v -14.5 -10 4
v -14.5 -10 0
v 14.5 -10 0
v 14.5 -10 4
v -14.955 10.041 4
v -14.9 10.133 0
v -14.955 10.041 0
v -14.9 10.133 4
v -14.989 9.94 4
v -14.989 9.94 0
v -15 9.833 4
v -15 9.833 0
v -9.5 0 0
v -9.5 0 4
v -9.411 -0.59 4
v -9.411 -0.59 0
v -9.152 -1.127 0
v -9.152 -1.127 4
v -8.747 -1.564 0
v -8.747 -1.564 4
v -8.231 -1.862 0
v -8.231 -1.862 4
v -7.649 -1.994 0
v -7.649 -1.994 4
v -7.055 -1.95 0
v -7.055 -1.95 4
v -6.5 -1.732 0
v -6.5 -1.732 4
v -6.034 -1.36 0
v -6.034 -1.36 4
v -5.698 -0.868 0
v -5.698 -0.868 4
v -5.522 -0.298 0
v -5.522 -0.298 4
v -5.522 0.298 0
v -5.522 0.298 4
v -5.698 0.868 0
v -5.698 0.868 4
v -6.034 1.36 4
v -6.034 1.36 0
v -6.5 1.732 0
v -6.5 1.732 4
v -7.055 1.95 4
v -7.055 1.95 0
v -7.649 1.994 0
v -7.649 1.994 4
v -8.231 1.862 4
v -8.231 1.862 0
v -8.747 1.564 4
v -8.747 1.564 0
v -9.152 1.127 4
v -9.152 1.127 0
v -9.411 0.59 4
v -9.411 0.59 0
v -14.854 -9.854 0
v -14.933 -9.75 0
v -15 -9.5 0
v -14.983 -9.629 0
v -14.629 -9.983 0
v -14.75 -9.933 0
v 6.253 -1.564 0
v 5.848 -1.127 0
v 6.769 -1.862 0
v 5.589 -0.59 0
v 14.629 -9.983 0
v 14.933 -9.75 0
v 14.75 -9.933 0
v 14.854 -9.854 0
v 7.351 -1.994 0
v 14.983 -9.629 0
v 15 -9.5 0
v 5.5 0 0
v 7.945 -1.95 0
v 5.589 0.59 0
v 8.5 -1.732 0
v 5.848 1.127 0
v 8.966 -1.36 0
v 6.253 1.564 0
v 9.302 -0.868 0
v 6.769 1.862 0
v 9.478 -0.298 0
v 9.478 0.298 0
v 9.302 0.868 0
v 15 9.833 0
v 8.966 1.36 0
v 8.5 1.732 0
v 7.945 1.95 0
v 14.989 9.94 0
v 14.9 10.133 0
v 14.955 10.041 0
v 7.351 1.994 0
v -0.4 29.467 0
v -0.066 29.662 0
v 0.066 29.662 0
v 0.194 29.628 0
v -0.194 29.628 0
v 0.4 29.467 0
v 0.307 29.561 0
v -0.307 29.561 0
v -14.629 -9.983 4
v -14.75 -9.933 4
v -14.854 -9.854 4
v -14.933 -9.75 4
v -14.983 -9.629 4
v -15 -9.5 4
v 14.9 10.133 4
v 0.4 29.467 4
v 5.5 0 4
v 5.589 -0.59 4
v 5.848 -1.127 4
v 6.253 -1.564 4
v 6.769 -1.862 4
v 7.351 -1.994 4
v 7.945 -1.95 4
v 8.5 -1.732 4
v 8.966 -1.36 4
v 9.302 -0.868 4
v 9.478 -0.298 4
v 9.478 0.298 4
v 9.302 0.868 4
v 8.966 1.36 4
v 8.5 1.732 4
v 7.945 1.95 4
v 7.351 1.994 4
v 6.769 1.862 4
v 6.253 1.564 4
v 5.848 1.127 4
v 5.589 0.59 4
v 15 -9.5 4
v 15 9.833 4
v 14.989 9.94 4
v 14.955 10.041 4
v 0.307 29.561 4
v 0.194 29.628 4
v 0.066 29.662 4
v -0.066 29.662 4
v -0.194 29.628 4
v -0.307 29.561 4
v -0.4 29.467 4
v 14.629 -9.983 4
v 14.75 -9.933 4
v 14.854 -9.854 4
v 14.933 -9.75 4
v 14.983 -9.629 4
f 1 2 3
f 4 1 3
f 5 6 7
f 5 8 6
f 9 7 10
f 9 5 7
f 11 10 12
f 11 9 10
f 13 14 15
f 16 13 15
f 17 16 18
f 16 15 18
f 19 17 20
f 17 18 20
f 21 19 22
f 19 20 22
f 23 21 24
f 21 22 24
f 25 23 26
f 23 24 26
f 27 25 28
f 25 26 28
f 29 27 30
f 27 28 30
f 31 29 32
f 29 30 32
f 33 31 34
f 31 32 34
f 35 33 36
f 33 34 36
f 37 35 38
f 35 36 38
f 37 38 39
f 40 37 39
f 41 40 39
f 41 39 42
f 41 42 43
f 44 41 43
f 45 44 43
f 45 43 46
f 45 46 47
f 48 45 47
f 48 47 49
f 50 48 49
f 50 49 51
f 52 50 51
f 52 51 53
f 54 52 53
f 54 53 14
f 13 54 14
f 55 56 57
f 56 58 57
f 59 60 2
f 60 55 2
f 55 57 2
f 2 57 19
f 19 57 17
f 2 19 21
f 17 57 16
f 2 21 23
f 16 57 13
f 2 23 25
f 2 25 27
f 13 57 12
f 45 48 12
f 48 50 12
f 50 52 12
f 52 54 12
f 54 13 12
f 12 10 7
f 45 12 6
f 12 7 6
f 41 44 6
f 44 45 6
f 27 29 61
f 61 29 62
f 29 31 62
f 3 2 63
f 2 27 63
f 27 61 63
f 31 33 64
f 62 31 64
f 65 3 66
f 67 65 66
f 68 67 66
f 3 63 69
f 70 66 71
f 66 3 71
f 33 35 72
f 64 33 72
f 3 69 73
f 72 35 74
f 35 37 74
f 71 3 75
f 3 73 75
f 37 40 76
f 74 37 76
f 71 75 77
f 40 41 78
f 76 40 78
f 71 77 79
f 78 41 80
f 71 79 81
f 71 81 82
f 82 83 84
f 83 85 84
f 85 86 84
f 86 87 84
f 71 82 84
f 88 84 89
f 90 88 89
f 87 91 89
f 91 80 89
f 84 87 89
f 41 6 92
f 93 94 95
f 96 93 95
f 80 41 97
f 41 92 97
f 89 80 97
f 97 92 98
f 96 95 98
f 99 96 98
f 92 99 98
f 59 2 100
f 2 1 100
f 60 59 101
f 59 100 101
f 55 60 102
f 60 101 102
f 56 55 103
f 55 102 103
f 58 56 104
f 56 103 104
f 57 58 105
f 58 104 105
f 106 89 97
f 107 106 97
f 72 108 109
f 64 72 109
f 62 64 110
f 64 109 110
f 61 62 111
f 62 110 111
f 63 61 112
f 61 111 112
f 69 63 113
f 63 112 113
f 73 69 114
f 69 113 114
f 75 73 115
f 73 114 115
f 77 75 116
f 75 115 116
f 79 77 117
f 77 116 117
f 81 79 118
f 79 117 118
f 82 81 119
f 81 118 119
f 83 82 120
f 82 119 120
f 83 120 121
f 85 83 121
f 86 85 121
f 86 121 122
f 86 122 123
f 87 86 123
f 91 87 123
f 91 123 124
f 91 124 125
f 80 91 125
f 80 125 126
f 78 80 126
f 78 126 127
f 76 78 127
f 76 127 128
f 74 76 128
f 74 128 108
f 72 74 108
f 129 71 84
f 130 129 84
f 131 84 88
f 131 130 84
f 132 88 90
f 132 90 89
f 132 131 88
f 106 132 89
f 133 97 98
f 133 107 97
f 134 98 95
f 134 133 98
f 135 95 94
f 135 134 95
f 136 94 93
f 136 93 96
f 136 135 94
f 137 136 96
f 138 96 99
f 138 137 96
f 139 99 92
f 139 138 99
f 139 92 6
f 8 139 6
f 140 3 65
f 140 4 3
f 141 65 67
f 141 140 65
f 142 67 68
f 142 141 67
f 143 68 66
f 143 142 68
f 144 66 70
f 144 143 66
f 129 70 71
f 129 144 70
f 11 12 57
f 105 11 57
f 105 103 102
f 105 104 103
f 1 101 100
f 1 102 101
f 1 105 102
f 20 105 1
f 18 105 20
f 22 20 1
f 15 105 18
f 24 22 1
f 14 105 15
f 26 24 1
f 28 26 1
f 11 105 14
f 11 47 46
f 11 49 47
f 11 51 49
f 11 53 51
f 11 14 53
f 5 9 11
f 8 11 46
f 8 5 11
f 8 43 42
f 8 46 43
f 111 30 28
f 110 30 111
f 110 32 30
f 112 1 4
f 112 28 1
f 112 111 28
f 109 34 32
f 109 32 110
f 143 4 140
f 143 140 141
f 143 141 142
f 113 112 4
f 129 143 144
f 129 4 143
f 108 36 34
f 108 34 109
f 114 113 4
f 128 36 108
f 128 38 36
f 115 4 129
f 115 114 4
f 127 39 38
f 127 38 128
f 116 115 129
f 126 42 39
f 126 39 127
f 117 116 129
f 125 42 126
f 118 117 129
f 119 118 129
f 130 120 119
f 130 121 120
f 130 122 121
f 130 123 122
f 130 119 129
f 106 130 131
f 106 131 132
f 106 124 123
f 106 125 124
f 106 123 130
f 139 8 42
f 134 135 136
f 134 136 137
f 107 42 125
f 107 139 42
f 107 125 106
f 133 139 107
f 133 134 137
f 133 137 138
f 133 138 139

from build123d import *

# Parameters (mm, degrees)
F1_DEPTH = 4
F2_R     = 0.5
F4_D     = 4


with BuildPart() as f1:
    # F0 (on Top) → F1 (new body)
    with BuildSketch(Plane.XY):
        Polygon((-15, -10), (15, -10), (15, 10), (0, 30), (-15, 10), align=None)
    extrude(amount=F1_DEPTH)

    # F2
    f2_edges = [f1.edges().sort_by_distance(p)[0] for p in [
        (15, 10, 2),
        (15, -10, 2),
        (0, 30, 2),
        (-15, 10, 2),
        (-15, -10, 2),
    ]]
    fillet(f2_edges, radius=F2_R)

    # F4 (through all)
    with Locations(Plane(origin=(0, 0, 0), x_dir=(1, 0, 0), z_dir=(0, 0, -1))):
        with Locations((7.5, 0), (-7.5, 0)):
            Hole(F4_D / 2)


solid = f1.part
